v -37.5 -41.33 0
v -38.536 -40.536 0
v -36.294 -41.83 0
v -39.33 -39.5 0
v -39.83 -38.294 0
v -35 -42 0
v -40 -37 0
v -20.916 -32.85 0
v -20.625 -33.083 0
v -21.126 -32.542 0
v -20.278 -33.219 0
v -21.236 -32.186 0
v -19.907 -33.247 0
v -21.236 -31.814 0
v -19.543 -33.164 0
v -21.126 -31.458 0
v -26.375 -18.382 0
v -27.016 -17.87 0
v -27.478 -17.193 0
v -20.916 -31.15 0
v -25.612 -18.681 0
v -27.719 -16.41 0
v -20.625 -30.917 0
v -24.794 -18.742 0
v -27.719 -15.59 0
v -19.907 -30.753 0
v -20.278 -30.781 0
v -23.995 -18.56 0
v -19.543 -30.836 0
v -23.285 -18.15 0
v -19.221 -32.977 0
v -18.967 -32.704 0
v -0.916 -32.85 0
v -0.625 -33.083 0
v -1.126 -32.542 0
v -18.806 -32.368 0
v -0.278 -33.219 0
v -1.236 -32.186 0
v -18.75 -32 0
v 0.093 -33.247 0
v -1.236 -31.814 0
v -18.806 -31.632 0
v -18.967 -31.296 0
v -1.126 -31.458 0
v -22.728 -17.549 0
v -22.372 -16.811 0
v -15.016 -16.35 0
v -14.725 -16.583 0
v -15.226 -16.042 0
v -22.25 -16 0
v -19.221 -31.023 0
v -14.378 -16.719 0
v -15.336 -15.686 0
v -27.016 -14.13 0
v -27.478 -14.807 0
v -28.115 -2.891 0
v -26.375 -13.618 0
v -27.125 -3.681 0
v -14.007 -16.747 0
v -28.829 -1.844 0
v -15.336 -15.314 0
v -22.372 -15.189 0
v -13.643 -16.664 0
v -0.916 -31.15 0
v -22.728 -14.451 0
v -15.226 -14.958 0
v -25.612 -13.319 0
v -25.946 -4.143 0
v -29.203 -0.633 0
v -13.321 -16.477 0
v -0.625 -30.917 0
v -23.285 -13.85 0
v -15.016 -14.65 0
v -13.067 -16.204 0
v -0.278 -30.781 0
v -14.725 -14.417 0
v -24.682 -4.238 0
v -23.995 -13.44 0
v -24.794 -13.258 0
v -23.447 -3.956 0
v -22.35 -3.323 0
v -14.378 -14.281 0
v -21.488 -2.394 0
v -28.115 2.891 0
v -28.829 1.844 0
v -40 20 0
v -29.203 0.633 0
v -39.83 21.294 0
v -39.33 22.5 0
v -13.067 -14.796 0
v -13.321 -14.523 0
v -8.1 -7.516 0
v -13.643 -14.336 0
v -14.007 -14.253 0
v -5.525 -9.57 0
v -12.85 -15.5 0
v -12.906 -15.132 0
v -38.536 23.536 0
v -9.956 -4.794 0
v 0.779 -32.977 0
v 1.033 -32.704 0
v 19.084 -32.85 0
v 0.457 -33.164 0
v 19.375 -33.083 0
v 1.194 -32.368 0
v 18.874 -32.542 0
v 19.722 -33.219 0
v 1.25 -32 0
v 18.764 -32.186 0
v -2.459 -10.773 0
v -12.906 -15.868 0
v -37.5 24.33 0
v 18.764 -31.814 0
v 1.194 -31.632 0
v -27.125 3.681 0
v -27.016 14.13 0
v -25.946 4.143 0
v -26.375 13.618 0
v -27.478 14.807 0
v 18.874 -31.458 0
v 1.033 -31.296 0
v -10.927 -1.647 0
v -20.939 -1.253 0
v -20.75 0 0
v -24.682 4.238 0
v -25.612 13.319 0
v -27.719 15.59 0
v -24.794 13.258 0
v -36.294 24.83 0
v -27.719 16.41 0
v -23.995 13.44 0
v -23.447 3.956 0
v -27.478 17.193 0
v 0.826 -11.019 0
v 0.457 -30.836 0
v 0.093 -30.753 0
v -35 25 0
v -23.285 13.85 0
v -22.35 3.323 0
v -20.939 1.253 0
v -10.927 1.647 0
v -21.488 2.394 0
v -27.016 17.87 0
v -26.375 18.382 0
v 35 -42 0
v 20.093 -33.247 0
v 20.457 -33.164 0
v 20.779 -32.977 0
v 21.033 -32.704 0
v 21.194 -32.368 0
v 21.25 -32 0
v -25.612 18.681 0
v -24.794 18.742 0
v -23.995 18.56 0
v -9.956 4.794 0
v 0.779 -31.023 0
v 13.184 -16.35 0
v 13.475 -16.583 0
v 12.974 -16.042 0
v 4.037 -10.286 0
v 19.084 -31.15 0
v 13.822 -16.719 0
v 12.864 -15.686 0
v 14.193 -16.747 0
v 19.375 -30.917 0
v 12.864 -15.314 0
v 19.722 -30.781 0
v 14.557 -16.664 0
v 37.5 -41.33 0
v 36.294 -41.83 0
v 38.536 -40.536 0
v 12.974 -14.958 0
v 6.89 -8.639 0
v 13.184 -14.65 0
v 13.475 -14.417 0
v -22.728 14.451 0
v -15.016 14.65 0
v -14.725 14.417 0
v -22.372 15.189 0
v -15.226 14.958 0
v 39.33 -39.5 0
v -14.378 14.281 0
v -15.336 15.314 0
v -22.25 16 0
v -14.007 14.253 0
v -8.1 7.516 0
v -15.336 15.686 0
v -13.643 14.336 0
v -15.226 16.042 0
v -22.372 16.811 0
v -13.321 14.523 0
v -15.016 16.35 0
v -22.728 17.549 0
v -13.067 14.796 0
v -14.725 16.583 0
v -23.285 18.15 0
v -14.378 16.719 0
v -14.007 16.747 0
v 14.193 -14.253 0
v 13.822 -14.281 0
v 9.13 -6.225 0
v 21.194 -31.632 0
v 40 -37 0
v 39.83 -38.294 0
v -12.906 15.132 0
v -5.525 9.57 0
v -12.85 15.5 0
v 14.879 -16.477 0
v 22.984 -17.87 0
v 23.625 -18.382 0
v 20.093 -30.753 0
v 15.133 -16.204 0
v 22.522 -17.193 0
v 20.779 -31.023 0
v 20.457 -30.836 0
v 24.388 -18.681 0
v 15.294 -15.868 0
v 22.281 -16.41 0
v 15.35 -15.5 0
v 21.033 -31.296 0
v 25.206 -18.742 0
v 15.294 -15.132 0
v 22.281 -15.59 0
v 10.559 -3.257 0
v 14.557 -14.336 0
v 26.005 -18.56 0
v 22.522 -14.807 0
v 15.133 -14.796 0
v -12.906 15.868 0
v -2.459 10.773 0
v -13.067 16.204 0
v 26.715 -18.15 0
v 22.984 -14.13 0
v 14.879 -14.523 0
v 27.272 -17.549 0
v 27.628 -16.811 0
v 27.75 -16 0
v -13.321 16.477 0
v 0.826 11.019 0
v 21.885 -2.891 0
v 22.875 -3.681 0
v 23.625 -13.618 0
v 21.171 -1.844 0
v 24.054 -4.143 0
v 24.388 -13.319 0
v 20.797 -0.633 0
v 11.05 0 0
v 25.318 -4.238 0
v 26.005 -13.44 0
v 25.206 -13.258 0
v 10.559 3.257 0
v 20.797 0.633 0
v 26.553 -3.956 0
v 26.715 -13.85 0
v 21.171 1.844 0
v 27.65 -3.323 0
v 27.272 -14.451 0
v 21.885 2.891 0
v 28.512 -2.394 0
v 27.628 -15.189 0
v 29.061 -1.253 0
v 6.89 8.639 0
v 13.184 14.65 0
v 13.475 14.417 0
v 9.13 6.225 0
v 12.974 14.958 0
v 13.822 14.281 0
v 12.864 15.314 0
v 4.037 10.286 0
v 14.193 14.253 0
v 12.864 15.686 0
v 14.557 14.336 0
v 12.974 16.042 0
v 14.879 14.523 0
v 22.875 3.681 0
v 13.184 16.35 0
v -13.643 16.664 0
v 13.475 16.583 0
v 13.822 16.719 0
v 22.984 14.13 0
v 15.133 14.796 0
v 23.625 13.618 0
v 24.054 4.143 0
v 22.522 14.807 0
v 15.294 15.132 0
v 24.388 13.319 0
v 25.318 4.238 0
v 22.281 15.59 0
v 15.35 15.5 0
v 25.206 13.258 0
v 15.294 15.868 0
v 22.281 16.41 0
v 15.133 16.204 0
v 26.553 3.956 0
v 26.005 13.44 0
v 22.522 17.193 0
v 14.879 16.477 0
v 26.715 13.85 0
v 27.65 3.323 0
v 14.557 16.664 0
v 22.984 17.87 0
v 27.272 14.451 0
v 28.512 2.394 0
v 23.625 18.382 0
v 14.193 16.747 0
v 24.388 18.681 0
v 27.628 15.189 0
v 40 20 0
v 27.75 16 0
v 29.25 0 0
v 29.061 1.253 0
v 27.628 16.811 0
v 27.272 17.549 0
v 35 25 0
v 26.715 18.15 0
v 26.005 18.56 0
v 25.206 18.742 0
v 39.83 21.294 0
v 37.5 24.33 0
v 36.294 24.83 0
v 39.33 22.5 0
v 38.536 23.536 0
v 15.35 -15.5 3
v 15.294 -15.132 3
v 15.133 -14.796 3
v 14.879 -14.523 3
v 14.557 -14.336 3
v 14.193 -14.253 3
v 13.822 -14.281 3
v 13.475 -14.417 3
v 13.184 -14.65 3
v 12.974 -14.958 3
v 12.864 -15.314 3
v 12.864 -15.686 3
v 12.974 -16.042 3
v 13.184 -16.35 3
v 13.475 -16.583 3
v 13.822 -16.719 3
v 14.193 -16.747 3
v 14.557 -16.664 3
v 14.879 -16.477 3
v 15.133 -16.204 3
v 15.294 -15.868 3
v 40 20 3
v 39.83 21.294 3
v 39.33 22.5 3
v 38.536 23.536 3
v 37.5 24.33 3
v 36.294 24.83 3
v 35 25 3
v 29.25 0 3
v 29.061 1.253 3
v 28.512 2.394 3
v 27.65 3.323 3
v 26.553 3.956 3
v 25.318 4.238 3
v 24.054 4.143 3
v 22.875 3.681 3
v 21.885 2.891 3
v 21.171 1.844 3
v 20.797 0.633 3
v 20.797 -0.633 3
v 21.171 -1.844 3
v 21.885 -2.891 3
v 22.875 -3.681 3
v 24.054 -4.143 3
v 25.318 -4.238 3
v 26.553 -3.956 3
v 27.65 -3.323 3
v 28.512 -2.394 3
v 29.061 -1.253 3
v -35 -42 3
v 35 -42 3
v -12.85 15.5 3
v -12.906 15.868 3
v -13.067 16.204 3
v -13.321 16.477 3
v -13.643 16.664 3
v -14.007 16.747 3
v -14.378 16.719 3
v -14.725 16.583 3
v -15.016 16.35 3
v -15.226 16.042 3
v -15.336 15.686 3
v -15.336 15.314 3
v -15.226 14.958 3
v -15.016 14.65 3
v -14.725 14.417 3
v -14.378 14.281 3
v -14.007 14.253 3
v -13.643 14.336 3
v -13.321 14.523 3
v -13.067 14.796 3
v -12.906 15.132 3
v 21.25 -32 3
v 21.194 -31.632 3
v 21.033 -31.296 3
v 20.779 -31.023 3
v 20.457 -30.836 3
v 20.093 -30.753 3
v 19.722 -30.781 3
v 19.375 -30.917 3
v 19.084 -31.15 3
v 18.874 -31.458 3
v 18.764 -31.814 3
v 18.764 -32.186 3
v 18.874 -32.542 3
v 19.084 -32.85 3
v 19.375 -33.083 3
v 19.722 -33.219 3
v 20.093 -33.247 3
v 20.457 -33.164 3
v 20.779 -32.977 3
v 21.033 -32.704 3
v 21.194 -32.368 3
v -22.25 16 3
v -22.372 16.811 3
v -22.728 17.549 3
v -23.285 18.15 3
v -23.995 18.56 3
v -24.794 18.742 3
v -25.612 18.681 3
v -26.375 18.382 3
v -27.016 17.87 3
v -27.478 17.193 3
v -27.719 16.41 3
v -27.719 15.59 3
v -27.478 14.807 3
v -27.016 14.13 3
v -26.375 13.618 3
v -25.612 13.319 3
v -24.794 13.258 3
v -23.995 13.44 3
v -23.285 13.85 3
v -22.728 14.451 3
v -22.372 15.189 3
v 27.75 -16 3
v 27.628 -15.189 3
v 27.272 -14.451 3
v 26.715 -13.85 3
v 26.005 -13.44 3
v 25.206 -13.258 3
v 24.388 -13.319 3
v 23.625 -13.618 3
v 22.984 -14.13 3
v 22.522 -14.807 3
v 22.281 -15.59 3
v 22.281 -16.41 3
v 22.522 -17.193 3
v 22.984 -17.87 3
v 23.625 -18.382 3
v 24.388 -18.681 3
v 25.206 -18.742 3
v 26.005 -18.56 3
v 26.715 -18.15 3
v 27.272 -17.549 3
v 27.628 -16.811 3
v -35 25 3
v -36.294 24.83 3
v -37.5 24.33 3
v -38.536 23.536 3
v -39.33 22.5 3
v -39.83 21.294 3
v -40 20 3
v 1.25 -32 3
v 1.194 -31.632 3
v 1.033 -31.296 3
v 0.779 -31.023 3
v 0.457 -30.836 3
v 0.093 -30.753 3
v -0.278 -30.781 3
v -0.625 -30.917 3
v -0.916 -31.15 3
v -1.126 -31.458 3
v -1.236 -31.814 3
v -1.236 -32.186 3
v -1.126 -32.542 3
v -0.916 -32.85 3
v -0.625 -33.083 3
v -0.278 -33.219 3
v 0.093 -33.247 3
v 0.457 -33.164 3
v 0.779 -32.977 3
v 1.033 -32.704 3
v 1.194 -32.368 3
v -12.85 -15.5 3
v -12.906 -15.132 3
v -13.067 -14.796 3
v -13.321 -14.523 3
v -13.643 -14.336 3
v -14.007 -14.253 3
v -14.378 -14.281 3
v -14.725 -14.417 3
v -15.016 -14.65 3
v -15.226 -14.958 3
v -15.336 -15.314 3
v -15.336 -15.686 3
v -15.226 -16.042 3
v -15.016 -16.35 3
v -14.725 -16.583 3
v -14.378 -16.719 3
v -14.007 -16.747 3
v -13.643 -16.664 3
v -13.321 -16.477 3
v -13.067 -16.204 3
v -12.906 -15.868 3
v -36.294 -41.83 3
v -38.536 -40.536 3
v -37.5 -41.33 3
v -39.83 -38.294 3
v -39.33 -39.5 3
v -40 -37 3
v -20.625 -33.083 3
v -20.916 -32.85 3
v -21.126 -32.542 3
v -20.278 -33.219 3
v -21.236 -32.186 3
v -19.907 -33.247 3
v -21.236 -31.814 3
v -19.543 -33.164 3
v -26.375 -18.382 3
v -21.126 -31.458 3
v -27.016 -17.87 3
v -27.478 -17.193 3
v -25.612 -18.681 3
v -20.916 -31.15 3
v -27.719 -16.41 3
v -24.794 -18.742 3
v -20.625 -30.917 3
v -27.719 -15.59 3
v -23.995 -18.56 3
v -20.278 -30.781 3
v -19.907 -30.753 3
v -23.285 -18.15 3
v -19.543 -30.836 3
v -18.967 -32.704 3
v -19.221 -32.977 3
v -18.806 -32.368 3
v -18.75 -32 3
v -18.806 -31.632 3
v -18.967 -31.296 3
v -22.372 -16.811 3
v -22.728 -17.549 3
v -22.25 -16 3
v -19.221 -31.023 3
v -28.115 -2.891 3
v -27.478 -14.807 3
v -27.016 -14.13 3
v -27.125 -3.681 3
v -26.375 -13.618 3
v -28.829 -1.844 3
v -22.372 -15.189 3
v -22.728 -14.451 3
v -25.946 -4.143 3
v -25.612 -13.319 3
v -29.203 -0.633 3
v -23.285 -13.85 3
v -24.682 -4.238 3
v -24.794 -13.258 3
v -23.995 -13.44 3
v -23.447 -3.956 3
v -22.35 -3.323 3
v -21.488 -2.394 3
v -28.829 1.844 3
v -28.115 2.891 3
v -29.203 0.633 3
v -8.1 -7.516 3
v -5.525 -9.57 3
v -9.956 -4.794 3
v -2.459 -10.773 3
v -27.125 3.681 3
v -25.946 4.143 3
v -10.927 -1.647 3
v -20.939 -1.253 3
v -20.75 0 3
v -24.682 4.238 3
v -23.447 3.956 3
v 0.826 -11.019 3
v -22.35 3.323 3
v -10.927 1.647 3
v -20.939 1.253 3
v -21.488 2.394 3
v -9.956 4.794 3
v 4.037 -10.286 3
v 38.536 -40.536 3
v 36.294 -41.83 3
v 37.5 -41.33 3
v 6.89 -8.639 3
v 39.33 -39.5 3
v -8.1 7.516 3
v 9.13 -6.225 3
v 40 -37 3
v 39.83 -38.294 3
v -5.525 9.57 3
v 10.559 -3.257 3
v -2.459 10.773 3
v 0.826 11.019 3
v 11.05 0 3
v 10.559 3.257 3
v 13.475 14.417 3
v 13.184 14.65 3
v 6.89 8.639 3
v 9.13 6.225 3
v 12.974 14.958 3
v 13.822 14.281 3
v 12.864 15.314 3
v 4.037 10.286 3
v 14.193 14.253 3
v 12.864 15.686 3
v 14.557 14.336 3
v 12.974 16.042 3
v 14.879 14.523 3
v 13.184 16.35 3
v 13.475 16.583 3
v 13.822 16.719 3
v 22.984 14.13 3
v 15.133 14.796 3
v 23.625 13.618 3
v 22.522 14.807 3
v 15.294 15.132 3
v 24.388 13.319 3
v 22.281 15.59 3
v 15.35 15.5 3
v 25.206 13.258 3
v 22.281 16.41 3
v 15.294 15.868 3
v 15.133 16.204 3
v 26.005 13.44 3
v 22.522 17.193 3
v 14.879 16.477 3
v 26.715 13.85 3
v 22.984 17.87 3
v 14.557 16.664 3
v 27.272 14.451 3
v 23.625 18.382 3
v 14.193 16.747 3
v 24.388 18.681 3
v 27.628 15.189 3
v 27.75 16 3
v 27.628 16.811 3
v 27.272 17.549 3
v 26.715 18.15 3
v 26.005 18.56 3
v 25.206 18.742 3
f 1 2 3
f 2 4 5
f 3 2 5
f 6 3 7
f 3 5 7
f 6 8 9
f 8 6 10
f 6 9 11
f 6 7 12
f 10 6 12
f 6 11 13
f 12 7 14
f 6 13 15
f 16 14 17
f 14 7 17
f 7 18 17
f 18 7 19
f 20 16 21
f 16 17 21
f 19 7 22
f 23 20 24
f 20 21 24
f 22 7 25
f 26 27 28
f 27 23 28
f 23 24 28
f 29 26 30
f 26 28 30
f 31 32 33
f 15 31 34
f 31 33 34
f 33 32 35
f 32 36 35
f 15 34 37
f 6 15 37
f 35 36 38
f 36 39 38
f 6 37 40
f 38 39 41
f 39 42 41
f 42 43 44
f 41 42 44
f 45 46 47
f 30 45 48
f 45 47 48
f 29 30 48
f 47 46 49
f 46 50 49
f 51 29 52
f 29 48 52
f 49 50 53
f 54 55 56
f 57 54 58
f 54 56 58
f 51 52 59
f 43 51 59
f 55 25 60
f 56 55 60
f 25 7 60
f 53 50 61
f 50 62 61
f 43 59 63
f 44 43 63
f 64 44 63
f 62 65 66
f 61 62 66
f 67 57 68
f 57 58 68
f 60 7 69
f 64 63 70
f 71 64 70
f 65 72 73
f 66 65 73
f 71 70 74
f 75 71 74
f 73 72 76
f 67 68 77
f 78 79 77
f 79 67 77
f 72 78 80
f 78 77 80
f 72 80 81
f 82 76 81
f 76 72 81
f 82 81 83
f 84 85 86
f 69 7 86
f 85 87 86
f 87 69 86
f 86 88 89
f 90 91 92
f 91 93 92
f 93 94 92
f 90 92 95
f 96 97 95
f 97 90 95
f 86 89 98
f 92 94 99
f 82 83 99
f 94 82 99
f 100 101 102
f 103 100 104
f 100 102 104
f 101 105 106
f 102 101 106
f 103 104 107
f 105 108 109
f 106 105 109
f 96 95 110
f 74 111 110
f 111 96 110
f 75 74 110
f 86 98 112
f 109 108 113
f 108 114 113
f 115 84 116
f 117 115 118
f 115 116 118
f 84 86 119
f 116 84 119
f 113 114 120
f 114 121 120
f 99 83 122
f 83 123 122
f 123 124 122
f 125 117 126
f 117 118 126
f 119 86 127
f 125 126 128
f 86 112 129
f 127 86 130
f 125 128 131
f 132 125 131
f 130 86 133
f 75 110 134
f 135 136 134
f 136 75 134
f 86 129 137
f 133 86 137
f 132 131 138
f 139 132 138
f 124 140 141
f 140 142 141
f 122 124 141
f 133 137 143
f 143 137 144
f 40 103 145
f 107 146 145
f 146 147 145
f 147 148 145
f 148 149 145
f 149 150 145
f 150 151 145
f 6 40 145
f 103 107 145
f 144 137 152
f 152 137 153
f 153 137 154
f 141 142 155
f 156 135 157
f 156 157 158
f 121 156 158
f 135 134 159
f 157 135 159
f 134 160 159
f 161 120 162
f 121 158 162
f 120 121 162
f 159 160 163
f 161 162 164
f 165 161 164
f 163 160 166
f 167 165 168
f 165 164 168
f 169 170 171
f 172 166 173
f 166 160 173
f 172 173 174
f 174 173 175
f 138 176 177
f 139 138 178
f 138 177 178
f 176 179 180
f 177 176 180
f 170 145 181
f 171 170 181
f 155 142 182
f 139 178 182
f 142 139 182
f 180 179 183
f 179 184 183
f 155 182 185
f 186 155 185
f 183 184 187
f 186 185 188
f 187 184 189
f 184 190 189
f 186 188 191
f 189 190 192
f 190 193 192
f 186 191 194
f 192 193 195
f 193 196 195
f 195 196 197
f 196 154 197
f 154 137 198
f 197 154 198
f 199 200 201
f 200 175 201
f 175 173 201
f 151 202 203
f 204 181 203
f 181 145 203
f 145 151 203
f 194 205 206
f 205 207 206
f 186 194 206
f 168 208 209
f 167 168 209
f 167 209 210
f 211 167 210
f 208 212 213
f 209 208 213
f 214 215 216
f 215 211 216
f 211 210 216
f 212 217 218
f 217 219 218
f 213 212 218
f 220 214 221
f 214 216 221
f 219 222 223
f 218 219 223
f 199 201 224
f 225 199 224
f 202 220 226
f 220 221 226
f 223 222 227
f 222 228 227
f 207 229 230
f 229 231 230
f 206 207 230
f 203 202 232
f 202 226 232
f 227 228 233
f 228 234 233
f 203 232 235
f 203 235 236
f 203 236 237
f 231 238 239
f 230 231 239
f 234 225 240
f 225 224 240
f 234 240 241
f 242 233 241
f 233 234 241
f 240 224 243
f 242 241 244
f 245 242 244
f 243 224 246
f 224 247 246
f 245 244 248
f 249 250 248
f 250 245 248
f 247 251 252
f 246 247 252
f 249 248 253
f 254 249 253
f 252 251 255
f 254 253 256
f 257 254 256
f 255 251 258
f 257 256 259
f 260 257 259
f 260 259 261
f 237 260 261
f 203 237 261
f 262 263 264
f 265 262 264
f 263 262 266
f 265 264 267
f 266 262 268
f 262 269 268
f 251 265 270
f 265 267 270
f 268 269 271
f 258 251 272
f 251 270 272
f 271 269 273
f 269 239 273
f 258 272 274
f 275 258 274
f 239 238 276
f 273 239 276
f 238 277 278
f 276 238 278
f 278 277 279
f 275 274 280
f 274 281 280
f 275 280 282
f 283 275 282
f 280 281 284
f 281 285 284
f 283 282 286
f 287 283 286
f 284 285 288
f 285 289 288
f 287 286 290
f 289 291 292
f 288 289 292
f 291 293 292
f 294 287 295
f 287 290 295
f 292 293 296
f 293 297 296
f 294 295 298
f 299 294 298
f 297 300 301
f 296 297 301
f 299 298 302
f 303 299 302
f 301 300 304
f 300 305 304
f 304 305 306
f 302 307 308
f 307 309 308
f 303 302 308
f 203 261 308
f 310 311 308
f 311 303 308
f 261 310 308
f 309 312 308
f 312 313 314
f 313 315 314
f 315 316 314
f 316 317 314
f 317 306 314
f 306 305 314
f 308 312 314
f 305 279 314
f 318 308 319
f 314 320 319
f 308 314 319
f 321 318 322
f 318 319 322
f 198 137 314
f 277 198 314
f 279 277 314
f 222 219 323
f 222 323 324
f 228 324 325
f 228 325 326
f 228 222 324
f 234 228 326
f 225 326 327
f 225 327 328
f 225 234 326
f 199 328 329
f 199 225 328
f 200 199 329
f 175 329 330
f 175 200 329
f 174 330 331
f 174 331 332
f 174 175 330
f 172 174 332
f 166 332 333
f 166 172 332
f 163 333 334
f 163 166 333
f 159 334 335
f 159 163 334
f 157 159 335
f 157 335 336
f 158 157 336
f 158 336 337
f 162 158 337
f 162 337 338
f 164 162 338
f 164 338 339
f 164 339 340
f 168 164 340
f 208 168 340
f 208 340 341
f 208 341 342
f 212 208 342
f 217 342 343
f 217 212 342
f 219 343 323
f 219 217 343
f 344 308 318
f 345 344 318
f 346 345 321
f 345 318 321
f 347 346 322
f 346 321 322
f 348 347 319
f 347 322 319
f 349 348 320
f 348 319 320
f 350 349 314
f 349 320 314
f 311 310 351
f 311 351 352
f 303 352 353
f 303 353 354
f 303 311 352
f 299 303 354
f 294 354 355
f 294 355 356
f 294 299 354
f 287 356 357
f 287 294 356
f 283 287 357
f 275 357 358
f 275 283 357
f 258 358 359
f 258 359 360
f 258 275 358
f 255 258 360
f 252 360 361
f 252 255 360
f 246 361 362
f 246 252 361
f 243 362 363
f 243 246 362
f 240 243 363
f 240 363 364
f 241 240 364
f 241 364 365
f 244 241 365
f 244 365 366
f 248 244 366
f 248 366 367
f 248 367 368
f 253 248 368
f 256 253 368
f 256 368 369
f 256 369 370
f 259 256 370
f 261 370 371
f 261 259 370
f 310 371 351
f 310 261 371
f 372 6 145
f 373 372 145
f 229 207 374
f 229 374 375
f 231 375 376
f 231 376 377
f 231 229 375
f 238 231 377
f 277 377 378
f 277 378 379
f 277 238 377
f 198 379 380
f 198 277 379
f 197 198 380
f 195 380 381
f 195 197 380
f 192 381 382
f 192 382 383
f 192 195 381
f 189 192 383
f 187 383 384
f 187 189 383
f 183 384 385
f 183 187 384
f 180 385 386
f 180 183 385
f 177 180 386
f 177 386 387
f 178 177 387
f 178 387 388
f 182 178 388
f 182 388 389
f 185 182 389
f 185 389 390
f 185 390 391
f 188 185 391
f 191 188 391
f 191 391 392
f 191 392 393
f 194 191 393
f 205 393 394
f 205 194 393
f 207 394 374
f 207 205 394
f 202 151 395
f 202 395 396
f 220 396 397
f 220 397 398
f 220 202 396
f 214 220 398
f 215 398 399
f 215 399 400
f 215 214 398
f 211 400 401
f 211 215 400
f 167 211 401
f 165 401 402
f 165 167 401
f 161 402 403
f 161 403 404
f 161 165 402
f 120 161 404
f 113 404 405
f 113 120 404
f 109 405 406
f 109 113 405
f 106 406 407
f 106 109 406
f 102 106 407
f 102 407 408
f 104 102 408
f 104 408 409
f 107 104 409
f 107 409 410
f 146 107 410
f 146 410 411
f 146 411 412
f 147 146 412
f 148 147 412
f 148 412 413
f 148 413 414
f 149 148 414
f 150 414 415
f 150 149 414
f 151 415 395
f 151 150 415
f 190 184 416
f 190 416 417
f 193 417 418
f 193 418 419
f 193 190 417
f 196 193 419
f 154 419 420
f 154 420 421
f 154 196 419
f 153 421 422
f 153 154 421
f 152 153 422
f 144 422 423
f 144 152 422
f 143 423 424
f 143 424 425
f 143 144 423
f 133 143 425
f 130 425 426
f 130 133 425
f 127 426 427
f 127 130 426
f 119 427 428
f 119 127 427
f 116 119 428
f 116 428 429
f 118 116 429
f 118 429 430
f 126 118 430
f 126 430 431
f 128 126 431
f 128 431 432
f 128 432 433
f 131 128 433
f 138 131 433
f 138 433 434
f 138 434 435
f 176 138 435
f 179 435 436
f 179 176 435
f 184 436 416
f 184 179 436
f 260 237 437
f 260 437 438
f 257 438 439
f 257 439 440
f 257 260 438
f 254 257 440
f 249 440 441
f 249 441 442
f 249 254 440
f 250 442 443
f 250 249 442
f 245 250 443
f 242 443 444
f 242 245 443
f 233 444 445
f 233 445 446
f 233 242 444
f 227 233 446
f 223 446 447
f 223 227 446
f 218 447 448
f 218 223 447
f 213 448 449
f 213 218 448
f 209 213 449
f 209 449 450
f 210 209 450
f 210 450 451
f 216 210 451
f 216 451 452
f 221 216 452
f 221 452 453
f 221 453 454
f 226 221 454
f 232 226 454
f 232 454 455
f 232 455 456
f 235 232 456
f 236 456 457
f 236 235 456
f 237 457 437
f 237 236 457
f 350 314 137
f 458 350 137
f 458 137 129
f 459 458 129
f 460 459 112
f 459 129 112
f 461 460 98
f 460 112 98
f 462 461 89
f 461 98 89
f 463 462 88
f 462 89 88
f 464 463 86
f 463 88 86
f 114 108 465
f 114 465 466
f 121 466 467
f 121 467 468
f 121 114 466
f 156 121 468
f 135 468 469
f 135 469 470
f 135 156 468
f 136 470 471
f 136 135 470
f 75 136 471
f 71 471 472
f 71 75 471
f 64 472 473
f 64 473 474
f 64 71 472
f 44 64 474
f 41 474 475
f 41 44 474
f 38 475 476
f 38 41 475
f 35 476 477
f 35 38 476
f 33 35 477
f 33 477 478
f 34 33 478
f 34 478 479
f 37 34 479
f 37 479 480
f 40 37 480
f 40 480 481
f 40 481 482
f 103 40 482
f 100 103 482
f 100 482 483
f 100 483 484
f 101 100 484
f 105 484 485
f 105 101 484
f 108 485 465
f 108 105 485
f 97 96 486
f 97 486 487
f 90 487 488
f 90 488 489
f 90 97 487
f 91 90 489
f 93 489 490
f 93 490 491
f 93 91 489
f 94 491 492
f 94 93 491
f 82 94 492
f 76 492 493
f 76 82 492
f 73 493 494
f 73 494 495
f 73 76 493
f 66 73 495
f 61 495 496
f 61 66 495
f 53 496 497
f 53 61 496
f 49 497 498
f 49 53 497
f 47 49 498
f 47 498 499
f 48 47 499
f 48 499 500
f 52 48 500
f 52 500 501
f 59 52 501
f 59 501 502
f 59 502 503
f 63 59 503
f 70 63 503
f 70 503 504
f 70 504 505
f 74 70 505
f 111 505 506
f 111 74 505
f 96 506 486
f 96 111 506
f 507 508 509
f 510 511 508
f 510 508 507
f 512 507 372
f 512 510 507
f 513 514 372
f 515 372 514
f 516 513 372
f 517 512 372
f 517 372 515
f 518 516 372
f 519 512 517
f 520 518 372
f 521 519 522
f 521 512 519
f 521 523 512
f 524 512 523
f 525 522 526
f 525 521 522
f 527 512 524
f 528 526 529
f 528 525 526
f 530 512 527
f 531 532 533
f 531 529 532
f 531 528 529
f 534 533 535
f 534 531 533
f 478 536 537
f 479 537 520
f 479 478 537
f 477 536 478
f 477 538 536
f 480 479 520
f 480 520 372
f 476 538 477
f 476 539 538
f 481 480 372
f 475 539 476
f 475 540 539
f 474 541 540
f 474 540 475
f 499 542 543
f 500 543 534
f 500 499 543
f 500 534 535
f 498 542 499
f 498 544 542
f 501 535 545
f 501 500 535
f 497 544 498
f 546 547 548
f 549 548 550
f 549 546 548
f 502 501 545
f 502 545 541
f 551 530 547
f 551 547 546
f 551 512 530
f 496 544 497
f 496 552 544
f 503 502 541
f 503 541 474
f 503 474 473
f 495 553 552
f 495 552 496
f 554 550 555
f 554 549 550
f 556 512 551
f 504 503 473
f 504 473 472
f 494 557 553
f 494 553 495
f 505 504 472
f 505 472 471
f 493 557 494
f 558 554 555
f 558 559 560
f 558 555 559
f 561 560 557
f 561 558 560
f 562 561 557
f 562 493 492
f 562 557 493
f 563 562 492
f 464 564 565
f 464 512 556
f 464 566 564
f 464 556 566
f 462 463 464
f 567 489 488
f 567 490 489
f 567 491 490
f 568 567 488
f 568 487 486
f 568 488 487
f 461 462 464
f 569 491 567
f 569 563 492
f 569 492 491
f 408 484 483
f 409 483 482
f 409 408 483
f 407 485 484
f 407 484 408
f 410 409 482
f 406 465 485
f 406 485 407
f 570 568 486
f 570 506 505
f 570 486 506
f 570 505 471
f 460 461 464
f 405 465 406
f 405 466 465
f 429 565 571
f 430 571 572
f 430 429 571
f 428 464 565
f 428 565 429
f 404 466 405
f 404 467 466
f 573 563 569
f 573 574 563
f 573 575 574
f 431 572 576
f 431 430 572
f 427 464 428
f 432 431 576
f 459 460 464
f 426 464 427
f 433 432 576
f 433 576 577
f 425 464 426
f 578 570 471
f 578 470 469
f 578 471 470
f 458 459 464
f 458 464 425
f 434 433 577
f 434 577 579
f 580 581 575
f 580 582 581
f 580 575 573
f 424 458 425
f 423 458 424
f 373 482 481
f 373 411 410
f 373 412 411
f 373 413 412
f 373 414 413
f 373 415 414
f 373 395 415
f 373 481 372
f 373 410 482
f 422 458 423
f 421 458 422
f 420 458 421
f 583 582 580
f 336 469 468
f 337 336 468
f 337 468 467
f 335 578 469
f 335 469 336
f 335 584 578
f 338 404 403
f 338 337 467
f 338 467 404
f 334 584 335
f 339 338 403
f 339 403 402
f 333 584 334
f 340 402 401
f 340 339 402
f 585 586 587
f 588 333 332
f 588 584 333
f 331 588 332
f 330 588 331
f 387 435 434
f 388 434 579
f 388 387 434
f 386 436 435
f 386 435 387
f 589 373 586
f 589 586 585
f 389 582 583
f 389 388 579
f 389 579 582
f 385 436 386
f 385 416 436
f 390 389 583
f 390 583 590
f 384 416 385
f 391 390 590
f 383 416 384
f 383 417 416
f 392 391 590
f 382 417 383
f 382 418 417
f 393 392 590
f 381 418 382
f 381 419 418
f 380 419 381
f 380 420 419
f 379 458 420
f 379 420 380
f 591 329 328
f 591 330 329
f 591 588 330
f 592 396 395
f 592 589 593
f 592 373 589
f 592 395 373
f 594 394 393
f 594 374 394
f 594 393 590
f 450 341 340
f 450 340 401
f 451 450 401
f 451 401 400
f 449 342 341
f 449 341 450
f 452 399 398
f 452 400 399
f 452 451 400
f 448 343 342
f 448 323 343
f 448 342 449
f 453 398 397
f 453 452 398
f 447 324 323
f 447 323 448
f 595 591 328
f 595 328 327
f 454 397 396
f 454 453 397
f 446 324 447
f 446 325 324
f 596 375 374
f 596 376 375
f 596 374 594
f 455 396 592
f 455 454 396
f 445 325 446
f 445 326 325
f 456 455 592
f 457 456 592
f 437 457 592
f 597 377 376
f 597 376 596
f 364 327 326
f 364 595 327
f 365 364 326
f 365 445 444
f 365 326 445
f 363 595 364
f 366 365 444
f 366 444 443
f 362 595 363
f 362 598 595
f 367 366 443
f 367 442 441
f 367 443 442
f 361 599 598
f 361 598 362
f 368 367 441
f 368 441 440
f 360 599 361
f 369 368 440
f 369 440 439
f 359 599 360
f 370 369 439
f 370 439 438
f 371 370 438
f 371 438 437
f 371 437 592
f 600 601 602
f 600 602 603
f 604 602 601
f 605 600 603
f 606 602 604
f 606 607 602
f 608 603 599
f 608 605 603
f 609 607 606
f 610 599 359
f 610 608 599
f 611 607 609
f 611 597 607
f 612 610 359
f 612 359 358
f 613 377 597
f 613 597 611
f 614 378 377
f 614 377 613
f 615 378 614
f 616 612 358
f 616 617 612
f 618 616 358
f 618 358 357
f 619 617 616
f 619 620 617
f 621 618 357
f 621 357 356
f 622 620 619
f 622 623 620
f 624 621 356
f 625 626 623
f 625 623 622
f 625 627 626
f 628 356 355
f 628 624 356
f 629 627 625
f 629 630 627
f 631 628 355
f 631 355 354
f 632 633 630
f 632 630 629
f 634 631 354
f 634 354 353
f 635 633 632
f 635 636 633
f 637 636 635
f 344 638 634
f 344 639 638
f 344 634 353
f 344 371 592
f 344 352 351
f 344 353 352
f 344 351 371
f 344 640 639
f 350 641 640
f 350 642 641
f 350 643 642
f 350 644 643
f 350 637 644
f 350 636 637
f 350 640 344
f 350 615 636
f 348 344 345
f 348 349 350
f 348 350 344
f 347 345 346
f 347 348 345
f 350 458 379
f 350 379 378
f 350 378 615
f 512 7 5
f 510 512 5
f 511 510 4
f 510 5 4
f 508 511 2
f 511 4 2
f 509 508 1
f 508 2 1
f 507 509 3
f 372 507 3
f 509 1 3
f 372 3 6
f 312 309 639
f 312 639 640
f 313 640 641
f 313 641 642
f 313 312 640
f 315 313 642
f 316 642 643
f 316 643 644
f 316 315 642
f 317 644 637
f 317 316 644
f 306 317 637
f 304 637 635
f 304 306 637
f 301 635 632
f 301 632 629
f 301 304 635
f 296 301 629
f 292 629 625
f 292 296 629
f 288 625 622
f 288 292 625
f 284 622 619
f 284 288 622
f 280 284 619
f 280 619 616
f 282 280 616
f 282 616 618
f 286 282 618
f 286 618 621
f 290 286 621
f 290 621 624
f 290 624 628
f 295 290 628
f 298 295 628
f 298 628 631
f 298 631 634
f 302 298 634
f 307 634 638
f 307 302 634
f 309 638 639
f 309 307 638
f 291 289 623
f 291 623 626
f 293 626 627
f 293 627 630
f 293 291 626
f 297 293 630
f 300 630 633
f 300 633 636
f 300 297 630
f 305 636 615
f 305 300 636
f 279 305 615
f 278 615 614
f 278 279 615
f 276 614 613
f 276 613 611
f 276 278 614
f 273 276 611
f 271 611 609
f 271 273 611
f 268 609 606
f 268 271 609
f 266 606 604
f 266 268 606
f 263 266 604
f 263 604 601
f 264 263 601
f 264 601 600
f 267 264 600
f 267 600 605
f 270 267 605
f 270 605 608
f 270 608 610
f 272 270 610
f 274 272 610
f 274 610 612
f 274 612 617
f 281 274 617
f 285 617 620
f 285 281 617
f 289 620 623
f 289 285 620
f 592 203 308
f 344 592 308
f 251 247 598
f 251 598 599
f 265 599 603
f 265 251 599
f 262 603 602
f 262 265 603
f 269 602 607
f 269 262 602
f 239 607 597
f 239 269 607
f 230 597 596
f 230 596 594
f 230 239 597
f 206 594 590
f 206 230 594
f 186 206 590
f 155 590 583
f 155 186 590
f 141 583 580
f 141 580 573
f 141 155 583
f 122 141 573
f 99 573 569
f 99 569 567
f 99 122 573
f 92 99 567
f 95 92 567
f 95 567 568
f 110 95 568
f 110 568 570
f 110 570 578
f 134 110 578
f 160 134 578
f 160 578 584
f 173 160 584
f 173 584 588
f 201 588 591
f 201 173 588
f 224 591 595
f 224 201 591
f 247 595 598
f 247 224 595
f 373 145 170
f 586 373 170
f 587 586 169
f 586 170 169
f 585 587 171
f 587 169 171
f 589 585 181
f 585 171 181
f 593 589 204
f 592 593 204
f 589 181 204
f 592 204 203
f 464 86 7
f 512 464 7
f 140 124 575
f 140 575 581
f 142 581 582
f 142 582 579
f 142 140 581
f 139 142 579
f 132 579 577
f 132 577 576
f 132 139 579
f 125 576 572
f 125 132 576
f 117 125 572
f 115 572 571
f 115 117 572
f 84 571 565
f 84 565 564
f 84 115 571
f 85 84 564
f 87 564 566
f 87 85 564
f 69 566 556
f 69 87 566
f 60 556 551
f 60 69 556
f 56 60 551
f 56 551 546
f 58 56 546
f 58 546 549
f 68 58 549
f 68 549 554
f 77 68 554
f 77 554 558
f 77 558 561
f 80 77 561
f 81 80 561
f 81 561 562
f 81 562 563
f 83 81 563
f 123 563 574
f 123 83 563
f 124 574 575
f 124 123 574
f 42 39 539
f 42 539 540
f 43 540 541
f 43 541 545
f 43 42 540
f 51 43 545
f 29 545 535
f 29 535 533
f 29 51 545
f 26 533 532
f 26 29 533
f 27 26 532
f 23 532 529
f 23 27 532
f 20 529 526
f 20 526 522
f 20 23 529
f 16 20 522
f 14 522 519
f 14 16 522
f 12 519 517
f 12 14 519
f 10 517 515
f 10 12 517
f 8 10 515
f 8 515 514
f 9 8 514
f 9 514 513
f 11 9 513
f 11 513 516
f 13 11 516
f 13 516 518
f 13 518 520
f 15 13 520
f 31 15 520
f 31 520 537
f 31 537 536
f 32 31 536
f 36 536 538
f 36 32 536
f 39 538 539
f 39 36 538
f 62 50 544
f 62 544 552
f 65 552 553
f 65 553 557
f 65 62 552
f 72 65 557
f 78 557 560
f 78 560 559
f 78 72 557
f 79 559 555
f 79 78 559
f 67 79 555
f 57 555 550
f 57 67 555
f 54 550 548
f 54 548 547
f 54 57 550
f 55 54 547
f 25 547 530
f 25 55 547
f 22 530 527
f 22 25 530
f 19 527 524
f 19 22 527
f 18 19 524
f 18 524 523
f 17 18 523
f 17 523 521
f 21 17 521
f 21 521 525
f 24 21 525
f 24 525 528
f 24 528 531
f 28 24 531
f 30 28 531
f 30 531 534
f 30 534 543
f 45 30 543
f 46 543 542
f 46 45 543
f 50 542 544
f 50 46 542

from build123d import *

# Parameters (mm, degrees)
SKETCH_1_R      = 11.05
SKETCH_1_R_2    = 2.75
SKETCH_1_R_3    = 1.25
SKETCH_1_R_4    = 4.25
EXTRUDE_1_DEPTH = 3


with BuildPart() as part:
    # 草图1 → 凸台-拉伸1 (new body)
    with BuildSketch(Plane.XY):
        with BuildLine():
            Line((-40, 20), (-40, -37))
            ThreePointArc((-40, -37), (-38.535533906, -40.535533906), (-35, -42))
            Line((-35, -42), (35, -42))
            ThreePointArc((35, -42), (38.535533906, -40.535533906), (40, -37))
            Line((40, -37), (40, 20))
            ThreePointArc((40, 20), (38.535533906, 23.535533906), (35, 25))
            Line((35, 25), (-35, 25))
            ThreePointArc((-35, 25), (-38.535533906, 23.535533906), (-40, 20))
        make_face()
        Circle(SKETCH_1_R, mode=Mode.SUBTRACT)
        with Locations((-25, 16)):
            Circle(SKETCH_1_R_2, mode=Mode.SUBTRACT)
        with Locations((-25, -16)):
            Circle(SKETCH_1_R_2, mode=Mode.SUBTRACT)
        with Locations((25, -16)):
            Circle(SKETCH_1_R_2, mode=Mode.SUBTRACT)
        with Locations((25, 16)):
            Circle(SKETCH_1_R_2, mode=Mode.SUBTRACT)
        with Locations((0, -32)):
            Circle(SKETCH_1_R_3, mode=Mode.SUBTRACT)
        with Locations((-20, -32)):
            Circle(SKETCH_1_R_3, mode=Mode.SUBTRACT)
        with Locations((20, -32)):
            Circle(SKETCH_1_R_3, mode=Mode.SUBTRACT)
        with Locations((-25, 0)):
            Circle(SKETCH_1_R_4, mode=Mode.SUBTRACT)
        with Locations((25, 0)):
            Circle(SKETCH_1_R_4, mode=Mode.SUBTRACT)
        with Locations((-14.1, 15.5)):
            Circle(SKETCH_1_R_3, mode=Mode.SUBTRACT)
        with Locations((14.1, 15.5)):
            Circle(SKETCH_1_R_3, mode=Mode.SUBTRACT)
        with Locations((14.1, -15.5)):
            Circle(SKETCH_1_R_3, mode=Mode.SUBTRACT)
        with Locations((-14.1, -15.5)):
            Circle(SKETCH_1_R_3, mode=Mode.SUBTRACT)
    extrude(amount=EXTRUDE_1_DEPTH)


solid = part.part
